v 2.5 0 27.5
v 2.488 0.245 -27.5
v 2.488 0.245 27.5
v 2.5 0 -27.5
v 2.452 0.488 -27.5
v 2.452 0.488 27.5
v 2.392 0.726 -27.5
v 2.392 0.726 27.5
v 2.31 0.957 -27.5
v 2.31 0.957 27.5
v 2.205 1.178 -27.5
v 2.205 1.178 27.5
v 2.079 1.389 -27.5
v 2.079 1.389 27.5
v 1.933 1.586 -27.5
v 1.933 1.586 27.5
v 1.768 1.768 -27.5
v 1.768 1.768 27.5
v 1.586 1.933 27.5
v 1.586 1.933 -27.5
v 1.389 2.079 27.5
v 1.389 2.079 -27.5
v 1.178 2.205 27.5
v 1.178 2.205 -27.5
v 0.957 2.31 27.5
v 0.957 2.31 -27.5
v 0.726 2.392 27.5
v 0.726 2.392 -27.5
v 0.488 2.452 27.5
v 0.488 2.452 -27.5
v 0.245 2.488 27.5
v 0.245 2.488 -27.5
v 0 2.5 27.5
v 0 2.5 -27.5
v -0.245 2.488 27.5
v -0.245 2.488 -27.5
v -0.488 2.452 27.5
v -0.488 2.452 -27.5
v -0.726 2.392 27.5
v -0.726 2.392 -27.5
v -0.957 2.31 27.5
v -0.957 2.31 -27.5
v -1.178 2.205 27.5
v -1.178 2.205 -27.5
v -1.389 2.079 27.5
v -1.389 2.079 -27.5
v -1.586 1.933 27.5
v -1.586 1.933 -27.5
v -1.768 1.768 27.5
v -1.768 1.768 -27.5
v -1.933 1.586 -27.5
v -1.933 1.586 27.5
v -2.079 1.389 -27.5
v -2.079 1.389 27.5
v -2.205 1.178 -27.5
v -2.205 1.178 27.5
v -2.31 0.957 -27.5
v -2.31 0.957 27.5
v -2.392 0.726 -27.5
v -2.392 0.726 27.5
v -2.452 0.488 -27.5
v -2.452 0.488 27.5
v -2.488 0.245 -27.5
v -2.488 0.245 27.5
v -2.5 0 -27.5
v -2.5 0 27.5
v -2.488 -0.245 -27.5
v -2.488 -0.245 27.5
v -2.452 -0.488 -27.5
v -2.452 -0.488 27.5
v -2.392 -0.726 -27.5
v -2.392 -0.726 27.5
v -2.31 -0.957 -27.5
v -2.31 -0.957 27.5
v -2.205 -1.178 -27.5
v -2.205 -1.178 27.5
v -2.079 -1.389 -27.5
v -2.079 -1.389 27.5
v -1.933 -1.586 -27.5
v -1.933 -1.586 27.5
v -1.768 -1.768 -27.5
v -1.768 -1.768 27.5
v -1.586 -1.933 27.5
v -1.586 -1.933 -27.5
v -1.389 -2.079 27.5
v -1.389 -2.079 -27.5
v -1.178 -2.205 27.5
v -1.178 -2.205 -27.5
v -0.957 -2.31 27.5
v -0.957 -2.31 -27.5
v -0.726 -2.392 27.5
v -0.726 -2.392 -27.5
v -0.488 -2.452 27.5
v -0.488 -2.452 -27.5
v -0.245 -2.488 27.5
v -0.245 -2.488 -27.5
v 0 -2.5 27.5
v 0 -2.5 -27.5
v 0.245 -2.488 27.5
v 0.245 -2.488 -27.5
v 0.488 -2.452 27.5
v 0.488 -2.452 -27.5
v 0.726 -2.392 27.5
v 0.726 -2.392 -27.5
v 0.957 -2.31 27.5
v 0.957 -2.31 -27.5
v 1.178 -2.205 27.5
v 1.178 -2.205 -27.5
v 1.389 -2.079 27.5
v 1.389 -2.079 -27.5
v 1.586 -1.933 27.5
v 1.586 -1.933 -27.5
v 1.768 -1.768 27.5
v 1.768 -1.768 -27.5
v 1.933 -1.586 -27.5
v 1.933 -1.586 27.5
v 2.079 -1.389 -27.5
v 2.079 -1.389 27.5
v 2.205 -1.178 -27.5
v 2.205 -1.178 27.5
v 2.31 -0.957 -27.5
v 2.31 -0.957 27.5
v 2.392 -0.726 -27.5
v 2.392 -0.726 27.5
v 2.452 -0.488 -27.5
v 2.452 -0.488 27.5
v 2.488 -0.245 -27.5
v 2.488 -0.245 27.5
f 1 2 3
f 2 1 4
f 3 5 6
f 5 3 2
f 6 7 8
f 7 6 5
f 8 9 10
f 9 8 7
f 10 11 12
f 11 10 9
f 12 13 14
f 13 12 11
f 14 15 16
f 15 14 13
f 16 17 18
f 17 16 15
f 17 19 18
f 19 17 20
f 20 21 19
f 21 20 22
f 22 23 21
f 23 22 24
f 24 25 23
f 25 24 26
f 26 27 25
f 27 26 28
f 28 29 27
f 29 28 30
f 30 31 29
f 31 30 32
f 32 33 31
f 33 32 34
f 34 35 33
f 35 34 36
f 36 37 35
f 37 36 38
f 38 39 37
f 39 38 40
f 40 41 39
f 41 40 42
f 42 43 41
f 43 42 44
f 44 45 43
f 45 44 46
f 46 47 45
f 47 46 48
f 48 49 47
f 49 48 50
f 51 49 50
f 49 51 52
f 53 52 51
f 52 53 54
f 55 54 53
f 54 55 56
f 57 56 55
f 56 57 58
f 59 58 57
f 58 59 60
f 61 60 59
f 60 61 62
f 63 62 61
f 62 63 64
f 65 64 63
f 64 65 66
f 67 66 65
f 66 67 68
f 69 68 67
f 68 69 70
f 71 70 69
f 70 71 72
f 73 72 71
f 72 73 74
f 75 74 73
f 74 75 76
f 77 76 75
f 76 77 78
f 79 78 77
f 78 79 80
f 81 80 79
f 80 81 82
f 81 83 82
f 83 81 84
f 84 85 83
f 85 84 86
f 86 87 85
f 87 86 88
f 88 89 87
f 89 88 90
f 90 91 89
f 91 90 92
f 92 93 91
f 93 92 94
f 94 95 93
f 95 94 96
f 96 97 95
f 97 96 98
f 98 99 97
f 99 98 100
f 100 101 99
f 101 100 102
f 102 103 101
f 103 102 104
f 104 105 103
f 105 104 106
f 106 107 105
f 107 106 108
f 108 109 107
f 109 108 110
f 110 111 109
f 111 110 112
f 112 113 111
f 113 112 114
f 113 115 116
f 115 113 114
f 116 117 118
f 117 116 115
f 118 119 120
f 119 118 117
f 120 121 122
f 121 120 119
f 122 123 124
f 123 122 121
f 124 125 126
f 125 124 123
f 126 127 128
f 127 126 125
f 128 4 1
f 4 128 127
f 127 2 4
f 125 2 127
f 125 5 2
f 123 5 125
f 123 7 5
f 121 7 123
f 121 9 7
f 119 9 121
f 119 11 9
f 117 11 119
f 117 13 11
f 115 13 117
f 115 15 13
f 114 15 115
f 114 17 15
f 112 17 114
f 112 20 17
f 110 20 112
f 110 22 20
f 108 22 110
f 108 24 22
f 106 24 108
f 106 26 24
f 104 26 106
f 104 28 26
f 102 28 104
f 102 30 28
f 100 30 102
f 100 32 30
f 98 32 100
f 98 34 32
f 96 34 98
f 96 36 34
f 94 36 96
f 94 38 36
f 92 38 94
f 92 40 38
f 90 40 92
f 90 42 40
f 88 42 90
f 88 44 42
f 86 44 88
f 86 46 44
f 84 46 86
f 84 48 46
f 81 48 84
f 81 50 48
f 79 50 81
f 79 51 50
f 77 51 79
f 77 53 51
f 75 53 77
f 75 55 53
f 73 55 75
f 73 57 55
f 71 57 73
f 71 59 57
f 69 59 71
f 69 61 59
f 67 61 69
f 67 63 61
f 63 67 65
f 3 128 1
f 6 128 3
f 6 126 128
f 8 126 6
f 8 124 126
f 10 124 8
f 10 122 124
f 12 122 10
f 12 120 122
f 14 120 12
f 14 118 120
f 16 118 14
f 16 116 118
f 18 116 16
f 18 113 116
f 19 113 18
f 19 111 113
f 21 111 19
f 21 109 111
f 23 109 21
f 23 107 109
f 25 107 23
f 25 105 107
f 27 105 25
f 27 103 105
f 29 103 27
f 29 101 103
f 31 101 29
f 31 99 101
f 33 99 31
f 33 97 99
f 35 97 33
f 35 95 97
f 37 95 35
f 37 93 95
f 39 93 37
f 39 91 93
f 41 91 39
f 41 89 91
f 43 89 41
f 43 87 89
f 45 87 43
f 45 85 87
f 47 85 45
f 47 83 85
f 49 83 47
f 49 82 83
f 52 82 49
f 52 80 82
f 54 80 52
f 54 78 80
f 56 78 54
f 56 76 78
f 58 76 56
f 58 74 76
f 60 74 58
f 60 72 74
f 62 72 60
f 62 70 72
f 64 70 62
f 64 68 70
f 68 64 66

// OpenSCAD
$fn = 64;
length = 55;
dia = 5.0;

cylinder(h=length, r=dia/2, center=true);
